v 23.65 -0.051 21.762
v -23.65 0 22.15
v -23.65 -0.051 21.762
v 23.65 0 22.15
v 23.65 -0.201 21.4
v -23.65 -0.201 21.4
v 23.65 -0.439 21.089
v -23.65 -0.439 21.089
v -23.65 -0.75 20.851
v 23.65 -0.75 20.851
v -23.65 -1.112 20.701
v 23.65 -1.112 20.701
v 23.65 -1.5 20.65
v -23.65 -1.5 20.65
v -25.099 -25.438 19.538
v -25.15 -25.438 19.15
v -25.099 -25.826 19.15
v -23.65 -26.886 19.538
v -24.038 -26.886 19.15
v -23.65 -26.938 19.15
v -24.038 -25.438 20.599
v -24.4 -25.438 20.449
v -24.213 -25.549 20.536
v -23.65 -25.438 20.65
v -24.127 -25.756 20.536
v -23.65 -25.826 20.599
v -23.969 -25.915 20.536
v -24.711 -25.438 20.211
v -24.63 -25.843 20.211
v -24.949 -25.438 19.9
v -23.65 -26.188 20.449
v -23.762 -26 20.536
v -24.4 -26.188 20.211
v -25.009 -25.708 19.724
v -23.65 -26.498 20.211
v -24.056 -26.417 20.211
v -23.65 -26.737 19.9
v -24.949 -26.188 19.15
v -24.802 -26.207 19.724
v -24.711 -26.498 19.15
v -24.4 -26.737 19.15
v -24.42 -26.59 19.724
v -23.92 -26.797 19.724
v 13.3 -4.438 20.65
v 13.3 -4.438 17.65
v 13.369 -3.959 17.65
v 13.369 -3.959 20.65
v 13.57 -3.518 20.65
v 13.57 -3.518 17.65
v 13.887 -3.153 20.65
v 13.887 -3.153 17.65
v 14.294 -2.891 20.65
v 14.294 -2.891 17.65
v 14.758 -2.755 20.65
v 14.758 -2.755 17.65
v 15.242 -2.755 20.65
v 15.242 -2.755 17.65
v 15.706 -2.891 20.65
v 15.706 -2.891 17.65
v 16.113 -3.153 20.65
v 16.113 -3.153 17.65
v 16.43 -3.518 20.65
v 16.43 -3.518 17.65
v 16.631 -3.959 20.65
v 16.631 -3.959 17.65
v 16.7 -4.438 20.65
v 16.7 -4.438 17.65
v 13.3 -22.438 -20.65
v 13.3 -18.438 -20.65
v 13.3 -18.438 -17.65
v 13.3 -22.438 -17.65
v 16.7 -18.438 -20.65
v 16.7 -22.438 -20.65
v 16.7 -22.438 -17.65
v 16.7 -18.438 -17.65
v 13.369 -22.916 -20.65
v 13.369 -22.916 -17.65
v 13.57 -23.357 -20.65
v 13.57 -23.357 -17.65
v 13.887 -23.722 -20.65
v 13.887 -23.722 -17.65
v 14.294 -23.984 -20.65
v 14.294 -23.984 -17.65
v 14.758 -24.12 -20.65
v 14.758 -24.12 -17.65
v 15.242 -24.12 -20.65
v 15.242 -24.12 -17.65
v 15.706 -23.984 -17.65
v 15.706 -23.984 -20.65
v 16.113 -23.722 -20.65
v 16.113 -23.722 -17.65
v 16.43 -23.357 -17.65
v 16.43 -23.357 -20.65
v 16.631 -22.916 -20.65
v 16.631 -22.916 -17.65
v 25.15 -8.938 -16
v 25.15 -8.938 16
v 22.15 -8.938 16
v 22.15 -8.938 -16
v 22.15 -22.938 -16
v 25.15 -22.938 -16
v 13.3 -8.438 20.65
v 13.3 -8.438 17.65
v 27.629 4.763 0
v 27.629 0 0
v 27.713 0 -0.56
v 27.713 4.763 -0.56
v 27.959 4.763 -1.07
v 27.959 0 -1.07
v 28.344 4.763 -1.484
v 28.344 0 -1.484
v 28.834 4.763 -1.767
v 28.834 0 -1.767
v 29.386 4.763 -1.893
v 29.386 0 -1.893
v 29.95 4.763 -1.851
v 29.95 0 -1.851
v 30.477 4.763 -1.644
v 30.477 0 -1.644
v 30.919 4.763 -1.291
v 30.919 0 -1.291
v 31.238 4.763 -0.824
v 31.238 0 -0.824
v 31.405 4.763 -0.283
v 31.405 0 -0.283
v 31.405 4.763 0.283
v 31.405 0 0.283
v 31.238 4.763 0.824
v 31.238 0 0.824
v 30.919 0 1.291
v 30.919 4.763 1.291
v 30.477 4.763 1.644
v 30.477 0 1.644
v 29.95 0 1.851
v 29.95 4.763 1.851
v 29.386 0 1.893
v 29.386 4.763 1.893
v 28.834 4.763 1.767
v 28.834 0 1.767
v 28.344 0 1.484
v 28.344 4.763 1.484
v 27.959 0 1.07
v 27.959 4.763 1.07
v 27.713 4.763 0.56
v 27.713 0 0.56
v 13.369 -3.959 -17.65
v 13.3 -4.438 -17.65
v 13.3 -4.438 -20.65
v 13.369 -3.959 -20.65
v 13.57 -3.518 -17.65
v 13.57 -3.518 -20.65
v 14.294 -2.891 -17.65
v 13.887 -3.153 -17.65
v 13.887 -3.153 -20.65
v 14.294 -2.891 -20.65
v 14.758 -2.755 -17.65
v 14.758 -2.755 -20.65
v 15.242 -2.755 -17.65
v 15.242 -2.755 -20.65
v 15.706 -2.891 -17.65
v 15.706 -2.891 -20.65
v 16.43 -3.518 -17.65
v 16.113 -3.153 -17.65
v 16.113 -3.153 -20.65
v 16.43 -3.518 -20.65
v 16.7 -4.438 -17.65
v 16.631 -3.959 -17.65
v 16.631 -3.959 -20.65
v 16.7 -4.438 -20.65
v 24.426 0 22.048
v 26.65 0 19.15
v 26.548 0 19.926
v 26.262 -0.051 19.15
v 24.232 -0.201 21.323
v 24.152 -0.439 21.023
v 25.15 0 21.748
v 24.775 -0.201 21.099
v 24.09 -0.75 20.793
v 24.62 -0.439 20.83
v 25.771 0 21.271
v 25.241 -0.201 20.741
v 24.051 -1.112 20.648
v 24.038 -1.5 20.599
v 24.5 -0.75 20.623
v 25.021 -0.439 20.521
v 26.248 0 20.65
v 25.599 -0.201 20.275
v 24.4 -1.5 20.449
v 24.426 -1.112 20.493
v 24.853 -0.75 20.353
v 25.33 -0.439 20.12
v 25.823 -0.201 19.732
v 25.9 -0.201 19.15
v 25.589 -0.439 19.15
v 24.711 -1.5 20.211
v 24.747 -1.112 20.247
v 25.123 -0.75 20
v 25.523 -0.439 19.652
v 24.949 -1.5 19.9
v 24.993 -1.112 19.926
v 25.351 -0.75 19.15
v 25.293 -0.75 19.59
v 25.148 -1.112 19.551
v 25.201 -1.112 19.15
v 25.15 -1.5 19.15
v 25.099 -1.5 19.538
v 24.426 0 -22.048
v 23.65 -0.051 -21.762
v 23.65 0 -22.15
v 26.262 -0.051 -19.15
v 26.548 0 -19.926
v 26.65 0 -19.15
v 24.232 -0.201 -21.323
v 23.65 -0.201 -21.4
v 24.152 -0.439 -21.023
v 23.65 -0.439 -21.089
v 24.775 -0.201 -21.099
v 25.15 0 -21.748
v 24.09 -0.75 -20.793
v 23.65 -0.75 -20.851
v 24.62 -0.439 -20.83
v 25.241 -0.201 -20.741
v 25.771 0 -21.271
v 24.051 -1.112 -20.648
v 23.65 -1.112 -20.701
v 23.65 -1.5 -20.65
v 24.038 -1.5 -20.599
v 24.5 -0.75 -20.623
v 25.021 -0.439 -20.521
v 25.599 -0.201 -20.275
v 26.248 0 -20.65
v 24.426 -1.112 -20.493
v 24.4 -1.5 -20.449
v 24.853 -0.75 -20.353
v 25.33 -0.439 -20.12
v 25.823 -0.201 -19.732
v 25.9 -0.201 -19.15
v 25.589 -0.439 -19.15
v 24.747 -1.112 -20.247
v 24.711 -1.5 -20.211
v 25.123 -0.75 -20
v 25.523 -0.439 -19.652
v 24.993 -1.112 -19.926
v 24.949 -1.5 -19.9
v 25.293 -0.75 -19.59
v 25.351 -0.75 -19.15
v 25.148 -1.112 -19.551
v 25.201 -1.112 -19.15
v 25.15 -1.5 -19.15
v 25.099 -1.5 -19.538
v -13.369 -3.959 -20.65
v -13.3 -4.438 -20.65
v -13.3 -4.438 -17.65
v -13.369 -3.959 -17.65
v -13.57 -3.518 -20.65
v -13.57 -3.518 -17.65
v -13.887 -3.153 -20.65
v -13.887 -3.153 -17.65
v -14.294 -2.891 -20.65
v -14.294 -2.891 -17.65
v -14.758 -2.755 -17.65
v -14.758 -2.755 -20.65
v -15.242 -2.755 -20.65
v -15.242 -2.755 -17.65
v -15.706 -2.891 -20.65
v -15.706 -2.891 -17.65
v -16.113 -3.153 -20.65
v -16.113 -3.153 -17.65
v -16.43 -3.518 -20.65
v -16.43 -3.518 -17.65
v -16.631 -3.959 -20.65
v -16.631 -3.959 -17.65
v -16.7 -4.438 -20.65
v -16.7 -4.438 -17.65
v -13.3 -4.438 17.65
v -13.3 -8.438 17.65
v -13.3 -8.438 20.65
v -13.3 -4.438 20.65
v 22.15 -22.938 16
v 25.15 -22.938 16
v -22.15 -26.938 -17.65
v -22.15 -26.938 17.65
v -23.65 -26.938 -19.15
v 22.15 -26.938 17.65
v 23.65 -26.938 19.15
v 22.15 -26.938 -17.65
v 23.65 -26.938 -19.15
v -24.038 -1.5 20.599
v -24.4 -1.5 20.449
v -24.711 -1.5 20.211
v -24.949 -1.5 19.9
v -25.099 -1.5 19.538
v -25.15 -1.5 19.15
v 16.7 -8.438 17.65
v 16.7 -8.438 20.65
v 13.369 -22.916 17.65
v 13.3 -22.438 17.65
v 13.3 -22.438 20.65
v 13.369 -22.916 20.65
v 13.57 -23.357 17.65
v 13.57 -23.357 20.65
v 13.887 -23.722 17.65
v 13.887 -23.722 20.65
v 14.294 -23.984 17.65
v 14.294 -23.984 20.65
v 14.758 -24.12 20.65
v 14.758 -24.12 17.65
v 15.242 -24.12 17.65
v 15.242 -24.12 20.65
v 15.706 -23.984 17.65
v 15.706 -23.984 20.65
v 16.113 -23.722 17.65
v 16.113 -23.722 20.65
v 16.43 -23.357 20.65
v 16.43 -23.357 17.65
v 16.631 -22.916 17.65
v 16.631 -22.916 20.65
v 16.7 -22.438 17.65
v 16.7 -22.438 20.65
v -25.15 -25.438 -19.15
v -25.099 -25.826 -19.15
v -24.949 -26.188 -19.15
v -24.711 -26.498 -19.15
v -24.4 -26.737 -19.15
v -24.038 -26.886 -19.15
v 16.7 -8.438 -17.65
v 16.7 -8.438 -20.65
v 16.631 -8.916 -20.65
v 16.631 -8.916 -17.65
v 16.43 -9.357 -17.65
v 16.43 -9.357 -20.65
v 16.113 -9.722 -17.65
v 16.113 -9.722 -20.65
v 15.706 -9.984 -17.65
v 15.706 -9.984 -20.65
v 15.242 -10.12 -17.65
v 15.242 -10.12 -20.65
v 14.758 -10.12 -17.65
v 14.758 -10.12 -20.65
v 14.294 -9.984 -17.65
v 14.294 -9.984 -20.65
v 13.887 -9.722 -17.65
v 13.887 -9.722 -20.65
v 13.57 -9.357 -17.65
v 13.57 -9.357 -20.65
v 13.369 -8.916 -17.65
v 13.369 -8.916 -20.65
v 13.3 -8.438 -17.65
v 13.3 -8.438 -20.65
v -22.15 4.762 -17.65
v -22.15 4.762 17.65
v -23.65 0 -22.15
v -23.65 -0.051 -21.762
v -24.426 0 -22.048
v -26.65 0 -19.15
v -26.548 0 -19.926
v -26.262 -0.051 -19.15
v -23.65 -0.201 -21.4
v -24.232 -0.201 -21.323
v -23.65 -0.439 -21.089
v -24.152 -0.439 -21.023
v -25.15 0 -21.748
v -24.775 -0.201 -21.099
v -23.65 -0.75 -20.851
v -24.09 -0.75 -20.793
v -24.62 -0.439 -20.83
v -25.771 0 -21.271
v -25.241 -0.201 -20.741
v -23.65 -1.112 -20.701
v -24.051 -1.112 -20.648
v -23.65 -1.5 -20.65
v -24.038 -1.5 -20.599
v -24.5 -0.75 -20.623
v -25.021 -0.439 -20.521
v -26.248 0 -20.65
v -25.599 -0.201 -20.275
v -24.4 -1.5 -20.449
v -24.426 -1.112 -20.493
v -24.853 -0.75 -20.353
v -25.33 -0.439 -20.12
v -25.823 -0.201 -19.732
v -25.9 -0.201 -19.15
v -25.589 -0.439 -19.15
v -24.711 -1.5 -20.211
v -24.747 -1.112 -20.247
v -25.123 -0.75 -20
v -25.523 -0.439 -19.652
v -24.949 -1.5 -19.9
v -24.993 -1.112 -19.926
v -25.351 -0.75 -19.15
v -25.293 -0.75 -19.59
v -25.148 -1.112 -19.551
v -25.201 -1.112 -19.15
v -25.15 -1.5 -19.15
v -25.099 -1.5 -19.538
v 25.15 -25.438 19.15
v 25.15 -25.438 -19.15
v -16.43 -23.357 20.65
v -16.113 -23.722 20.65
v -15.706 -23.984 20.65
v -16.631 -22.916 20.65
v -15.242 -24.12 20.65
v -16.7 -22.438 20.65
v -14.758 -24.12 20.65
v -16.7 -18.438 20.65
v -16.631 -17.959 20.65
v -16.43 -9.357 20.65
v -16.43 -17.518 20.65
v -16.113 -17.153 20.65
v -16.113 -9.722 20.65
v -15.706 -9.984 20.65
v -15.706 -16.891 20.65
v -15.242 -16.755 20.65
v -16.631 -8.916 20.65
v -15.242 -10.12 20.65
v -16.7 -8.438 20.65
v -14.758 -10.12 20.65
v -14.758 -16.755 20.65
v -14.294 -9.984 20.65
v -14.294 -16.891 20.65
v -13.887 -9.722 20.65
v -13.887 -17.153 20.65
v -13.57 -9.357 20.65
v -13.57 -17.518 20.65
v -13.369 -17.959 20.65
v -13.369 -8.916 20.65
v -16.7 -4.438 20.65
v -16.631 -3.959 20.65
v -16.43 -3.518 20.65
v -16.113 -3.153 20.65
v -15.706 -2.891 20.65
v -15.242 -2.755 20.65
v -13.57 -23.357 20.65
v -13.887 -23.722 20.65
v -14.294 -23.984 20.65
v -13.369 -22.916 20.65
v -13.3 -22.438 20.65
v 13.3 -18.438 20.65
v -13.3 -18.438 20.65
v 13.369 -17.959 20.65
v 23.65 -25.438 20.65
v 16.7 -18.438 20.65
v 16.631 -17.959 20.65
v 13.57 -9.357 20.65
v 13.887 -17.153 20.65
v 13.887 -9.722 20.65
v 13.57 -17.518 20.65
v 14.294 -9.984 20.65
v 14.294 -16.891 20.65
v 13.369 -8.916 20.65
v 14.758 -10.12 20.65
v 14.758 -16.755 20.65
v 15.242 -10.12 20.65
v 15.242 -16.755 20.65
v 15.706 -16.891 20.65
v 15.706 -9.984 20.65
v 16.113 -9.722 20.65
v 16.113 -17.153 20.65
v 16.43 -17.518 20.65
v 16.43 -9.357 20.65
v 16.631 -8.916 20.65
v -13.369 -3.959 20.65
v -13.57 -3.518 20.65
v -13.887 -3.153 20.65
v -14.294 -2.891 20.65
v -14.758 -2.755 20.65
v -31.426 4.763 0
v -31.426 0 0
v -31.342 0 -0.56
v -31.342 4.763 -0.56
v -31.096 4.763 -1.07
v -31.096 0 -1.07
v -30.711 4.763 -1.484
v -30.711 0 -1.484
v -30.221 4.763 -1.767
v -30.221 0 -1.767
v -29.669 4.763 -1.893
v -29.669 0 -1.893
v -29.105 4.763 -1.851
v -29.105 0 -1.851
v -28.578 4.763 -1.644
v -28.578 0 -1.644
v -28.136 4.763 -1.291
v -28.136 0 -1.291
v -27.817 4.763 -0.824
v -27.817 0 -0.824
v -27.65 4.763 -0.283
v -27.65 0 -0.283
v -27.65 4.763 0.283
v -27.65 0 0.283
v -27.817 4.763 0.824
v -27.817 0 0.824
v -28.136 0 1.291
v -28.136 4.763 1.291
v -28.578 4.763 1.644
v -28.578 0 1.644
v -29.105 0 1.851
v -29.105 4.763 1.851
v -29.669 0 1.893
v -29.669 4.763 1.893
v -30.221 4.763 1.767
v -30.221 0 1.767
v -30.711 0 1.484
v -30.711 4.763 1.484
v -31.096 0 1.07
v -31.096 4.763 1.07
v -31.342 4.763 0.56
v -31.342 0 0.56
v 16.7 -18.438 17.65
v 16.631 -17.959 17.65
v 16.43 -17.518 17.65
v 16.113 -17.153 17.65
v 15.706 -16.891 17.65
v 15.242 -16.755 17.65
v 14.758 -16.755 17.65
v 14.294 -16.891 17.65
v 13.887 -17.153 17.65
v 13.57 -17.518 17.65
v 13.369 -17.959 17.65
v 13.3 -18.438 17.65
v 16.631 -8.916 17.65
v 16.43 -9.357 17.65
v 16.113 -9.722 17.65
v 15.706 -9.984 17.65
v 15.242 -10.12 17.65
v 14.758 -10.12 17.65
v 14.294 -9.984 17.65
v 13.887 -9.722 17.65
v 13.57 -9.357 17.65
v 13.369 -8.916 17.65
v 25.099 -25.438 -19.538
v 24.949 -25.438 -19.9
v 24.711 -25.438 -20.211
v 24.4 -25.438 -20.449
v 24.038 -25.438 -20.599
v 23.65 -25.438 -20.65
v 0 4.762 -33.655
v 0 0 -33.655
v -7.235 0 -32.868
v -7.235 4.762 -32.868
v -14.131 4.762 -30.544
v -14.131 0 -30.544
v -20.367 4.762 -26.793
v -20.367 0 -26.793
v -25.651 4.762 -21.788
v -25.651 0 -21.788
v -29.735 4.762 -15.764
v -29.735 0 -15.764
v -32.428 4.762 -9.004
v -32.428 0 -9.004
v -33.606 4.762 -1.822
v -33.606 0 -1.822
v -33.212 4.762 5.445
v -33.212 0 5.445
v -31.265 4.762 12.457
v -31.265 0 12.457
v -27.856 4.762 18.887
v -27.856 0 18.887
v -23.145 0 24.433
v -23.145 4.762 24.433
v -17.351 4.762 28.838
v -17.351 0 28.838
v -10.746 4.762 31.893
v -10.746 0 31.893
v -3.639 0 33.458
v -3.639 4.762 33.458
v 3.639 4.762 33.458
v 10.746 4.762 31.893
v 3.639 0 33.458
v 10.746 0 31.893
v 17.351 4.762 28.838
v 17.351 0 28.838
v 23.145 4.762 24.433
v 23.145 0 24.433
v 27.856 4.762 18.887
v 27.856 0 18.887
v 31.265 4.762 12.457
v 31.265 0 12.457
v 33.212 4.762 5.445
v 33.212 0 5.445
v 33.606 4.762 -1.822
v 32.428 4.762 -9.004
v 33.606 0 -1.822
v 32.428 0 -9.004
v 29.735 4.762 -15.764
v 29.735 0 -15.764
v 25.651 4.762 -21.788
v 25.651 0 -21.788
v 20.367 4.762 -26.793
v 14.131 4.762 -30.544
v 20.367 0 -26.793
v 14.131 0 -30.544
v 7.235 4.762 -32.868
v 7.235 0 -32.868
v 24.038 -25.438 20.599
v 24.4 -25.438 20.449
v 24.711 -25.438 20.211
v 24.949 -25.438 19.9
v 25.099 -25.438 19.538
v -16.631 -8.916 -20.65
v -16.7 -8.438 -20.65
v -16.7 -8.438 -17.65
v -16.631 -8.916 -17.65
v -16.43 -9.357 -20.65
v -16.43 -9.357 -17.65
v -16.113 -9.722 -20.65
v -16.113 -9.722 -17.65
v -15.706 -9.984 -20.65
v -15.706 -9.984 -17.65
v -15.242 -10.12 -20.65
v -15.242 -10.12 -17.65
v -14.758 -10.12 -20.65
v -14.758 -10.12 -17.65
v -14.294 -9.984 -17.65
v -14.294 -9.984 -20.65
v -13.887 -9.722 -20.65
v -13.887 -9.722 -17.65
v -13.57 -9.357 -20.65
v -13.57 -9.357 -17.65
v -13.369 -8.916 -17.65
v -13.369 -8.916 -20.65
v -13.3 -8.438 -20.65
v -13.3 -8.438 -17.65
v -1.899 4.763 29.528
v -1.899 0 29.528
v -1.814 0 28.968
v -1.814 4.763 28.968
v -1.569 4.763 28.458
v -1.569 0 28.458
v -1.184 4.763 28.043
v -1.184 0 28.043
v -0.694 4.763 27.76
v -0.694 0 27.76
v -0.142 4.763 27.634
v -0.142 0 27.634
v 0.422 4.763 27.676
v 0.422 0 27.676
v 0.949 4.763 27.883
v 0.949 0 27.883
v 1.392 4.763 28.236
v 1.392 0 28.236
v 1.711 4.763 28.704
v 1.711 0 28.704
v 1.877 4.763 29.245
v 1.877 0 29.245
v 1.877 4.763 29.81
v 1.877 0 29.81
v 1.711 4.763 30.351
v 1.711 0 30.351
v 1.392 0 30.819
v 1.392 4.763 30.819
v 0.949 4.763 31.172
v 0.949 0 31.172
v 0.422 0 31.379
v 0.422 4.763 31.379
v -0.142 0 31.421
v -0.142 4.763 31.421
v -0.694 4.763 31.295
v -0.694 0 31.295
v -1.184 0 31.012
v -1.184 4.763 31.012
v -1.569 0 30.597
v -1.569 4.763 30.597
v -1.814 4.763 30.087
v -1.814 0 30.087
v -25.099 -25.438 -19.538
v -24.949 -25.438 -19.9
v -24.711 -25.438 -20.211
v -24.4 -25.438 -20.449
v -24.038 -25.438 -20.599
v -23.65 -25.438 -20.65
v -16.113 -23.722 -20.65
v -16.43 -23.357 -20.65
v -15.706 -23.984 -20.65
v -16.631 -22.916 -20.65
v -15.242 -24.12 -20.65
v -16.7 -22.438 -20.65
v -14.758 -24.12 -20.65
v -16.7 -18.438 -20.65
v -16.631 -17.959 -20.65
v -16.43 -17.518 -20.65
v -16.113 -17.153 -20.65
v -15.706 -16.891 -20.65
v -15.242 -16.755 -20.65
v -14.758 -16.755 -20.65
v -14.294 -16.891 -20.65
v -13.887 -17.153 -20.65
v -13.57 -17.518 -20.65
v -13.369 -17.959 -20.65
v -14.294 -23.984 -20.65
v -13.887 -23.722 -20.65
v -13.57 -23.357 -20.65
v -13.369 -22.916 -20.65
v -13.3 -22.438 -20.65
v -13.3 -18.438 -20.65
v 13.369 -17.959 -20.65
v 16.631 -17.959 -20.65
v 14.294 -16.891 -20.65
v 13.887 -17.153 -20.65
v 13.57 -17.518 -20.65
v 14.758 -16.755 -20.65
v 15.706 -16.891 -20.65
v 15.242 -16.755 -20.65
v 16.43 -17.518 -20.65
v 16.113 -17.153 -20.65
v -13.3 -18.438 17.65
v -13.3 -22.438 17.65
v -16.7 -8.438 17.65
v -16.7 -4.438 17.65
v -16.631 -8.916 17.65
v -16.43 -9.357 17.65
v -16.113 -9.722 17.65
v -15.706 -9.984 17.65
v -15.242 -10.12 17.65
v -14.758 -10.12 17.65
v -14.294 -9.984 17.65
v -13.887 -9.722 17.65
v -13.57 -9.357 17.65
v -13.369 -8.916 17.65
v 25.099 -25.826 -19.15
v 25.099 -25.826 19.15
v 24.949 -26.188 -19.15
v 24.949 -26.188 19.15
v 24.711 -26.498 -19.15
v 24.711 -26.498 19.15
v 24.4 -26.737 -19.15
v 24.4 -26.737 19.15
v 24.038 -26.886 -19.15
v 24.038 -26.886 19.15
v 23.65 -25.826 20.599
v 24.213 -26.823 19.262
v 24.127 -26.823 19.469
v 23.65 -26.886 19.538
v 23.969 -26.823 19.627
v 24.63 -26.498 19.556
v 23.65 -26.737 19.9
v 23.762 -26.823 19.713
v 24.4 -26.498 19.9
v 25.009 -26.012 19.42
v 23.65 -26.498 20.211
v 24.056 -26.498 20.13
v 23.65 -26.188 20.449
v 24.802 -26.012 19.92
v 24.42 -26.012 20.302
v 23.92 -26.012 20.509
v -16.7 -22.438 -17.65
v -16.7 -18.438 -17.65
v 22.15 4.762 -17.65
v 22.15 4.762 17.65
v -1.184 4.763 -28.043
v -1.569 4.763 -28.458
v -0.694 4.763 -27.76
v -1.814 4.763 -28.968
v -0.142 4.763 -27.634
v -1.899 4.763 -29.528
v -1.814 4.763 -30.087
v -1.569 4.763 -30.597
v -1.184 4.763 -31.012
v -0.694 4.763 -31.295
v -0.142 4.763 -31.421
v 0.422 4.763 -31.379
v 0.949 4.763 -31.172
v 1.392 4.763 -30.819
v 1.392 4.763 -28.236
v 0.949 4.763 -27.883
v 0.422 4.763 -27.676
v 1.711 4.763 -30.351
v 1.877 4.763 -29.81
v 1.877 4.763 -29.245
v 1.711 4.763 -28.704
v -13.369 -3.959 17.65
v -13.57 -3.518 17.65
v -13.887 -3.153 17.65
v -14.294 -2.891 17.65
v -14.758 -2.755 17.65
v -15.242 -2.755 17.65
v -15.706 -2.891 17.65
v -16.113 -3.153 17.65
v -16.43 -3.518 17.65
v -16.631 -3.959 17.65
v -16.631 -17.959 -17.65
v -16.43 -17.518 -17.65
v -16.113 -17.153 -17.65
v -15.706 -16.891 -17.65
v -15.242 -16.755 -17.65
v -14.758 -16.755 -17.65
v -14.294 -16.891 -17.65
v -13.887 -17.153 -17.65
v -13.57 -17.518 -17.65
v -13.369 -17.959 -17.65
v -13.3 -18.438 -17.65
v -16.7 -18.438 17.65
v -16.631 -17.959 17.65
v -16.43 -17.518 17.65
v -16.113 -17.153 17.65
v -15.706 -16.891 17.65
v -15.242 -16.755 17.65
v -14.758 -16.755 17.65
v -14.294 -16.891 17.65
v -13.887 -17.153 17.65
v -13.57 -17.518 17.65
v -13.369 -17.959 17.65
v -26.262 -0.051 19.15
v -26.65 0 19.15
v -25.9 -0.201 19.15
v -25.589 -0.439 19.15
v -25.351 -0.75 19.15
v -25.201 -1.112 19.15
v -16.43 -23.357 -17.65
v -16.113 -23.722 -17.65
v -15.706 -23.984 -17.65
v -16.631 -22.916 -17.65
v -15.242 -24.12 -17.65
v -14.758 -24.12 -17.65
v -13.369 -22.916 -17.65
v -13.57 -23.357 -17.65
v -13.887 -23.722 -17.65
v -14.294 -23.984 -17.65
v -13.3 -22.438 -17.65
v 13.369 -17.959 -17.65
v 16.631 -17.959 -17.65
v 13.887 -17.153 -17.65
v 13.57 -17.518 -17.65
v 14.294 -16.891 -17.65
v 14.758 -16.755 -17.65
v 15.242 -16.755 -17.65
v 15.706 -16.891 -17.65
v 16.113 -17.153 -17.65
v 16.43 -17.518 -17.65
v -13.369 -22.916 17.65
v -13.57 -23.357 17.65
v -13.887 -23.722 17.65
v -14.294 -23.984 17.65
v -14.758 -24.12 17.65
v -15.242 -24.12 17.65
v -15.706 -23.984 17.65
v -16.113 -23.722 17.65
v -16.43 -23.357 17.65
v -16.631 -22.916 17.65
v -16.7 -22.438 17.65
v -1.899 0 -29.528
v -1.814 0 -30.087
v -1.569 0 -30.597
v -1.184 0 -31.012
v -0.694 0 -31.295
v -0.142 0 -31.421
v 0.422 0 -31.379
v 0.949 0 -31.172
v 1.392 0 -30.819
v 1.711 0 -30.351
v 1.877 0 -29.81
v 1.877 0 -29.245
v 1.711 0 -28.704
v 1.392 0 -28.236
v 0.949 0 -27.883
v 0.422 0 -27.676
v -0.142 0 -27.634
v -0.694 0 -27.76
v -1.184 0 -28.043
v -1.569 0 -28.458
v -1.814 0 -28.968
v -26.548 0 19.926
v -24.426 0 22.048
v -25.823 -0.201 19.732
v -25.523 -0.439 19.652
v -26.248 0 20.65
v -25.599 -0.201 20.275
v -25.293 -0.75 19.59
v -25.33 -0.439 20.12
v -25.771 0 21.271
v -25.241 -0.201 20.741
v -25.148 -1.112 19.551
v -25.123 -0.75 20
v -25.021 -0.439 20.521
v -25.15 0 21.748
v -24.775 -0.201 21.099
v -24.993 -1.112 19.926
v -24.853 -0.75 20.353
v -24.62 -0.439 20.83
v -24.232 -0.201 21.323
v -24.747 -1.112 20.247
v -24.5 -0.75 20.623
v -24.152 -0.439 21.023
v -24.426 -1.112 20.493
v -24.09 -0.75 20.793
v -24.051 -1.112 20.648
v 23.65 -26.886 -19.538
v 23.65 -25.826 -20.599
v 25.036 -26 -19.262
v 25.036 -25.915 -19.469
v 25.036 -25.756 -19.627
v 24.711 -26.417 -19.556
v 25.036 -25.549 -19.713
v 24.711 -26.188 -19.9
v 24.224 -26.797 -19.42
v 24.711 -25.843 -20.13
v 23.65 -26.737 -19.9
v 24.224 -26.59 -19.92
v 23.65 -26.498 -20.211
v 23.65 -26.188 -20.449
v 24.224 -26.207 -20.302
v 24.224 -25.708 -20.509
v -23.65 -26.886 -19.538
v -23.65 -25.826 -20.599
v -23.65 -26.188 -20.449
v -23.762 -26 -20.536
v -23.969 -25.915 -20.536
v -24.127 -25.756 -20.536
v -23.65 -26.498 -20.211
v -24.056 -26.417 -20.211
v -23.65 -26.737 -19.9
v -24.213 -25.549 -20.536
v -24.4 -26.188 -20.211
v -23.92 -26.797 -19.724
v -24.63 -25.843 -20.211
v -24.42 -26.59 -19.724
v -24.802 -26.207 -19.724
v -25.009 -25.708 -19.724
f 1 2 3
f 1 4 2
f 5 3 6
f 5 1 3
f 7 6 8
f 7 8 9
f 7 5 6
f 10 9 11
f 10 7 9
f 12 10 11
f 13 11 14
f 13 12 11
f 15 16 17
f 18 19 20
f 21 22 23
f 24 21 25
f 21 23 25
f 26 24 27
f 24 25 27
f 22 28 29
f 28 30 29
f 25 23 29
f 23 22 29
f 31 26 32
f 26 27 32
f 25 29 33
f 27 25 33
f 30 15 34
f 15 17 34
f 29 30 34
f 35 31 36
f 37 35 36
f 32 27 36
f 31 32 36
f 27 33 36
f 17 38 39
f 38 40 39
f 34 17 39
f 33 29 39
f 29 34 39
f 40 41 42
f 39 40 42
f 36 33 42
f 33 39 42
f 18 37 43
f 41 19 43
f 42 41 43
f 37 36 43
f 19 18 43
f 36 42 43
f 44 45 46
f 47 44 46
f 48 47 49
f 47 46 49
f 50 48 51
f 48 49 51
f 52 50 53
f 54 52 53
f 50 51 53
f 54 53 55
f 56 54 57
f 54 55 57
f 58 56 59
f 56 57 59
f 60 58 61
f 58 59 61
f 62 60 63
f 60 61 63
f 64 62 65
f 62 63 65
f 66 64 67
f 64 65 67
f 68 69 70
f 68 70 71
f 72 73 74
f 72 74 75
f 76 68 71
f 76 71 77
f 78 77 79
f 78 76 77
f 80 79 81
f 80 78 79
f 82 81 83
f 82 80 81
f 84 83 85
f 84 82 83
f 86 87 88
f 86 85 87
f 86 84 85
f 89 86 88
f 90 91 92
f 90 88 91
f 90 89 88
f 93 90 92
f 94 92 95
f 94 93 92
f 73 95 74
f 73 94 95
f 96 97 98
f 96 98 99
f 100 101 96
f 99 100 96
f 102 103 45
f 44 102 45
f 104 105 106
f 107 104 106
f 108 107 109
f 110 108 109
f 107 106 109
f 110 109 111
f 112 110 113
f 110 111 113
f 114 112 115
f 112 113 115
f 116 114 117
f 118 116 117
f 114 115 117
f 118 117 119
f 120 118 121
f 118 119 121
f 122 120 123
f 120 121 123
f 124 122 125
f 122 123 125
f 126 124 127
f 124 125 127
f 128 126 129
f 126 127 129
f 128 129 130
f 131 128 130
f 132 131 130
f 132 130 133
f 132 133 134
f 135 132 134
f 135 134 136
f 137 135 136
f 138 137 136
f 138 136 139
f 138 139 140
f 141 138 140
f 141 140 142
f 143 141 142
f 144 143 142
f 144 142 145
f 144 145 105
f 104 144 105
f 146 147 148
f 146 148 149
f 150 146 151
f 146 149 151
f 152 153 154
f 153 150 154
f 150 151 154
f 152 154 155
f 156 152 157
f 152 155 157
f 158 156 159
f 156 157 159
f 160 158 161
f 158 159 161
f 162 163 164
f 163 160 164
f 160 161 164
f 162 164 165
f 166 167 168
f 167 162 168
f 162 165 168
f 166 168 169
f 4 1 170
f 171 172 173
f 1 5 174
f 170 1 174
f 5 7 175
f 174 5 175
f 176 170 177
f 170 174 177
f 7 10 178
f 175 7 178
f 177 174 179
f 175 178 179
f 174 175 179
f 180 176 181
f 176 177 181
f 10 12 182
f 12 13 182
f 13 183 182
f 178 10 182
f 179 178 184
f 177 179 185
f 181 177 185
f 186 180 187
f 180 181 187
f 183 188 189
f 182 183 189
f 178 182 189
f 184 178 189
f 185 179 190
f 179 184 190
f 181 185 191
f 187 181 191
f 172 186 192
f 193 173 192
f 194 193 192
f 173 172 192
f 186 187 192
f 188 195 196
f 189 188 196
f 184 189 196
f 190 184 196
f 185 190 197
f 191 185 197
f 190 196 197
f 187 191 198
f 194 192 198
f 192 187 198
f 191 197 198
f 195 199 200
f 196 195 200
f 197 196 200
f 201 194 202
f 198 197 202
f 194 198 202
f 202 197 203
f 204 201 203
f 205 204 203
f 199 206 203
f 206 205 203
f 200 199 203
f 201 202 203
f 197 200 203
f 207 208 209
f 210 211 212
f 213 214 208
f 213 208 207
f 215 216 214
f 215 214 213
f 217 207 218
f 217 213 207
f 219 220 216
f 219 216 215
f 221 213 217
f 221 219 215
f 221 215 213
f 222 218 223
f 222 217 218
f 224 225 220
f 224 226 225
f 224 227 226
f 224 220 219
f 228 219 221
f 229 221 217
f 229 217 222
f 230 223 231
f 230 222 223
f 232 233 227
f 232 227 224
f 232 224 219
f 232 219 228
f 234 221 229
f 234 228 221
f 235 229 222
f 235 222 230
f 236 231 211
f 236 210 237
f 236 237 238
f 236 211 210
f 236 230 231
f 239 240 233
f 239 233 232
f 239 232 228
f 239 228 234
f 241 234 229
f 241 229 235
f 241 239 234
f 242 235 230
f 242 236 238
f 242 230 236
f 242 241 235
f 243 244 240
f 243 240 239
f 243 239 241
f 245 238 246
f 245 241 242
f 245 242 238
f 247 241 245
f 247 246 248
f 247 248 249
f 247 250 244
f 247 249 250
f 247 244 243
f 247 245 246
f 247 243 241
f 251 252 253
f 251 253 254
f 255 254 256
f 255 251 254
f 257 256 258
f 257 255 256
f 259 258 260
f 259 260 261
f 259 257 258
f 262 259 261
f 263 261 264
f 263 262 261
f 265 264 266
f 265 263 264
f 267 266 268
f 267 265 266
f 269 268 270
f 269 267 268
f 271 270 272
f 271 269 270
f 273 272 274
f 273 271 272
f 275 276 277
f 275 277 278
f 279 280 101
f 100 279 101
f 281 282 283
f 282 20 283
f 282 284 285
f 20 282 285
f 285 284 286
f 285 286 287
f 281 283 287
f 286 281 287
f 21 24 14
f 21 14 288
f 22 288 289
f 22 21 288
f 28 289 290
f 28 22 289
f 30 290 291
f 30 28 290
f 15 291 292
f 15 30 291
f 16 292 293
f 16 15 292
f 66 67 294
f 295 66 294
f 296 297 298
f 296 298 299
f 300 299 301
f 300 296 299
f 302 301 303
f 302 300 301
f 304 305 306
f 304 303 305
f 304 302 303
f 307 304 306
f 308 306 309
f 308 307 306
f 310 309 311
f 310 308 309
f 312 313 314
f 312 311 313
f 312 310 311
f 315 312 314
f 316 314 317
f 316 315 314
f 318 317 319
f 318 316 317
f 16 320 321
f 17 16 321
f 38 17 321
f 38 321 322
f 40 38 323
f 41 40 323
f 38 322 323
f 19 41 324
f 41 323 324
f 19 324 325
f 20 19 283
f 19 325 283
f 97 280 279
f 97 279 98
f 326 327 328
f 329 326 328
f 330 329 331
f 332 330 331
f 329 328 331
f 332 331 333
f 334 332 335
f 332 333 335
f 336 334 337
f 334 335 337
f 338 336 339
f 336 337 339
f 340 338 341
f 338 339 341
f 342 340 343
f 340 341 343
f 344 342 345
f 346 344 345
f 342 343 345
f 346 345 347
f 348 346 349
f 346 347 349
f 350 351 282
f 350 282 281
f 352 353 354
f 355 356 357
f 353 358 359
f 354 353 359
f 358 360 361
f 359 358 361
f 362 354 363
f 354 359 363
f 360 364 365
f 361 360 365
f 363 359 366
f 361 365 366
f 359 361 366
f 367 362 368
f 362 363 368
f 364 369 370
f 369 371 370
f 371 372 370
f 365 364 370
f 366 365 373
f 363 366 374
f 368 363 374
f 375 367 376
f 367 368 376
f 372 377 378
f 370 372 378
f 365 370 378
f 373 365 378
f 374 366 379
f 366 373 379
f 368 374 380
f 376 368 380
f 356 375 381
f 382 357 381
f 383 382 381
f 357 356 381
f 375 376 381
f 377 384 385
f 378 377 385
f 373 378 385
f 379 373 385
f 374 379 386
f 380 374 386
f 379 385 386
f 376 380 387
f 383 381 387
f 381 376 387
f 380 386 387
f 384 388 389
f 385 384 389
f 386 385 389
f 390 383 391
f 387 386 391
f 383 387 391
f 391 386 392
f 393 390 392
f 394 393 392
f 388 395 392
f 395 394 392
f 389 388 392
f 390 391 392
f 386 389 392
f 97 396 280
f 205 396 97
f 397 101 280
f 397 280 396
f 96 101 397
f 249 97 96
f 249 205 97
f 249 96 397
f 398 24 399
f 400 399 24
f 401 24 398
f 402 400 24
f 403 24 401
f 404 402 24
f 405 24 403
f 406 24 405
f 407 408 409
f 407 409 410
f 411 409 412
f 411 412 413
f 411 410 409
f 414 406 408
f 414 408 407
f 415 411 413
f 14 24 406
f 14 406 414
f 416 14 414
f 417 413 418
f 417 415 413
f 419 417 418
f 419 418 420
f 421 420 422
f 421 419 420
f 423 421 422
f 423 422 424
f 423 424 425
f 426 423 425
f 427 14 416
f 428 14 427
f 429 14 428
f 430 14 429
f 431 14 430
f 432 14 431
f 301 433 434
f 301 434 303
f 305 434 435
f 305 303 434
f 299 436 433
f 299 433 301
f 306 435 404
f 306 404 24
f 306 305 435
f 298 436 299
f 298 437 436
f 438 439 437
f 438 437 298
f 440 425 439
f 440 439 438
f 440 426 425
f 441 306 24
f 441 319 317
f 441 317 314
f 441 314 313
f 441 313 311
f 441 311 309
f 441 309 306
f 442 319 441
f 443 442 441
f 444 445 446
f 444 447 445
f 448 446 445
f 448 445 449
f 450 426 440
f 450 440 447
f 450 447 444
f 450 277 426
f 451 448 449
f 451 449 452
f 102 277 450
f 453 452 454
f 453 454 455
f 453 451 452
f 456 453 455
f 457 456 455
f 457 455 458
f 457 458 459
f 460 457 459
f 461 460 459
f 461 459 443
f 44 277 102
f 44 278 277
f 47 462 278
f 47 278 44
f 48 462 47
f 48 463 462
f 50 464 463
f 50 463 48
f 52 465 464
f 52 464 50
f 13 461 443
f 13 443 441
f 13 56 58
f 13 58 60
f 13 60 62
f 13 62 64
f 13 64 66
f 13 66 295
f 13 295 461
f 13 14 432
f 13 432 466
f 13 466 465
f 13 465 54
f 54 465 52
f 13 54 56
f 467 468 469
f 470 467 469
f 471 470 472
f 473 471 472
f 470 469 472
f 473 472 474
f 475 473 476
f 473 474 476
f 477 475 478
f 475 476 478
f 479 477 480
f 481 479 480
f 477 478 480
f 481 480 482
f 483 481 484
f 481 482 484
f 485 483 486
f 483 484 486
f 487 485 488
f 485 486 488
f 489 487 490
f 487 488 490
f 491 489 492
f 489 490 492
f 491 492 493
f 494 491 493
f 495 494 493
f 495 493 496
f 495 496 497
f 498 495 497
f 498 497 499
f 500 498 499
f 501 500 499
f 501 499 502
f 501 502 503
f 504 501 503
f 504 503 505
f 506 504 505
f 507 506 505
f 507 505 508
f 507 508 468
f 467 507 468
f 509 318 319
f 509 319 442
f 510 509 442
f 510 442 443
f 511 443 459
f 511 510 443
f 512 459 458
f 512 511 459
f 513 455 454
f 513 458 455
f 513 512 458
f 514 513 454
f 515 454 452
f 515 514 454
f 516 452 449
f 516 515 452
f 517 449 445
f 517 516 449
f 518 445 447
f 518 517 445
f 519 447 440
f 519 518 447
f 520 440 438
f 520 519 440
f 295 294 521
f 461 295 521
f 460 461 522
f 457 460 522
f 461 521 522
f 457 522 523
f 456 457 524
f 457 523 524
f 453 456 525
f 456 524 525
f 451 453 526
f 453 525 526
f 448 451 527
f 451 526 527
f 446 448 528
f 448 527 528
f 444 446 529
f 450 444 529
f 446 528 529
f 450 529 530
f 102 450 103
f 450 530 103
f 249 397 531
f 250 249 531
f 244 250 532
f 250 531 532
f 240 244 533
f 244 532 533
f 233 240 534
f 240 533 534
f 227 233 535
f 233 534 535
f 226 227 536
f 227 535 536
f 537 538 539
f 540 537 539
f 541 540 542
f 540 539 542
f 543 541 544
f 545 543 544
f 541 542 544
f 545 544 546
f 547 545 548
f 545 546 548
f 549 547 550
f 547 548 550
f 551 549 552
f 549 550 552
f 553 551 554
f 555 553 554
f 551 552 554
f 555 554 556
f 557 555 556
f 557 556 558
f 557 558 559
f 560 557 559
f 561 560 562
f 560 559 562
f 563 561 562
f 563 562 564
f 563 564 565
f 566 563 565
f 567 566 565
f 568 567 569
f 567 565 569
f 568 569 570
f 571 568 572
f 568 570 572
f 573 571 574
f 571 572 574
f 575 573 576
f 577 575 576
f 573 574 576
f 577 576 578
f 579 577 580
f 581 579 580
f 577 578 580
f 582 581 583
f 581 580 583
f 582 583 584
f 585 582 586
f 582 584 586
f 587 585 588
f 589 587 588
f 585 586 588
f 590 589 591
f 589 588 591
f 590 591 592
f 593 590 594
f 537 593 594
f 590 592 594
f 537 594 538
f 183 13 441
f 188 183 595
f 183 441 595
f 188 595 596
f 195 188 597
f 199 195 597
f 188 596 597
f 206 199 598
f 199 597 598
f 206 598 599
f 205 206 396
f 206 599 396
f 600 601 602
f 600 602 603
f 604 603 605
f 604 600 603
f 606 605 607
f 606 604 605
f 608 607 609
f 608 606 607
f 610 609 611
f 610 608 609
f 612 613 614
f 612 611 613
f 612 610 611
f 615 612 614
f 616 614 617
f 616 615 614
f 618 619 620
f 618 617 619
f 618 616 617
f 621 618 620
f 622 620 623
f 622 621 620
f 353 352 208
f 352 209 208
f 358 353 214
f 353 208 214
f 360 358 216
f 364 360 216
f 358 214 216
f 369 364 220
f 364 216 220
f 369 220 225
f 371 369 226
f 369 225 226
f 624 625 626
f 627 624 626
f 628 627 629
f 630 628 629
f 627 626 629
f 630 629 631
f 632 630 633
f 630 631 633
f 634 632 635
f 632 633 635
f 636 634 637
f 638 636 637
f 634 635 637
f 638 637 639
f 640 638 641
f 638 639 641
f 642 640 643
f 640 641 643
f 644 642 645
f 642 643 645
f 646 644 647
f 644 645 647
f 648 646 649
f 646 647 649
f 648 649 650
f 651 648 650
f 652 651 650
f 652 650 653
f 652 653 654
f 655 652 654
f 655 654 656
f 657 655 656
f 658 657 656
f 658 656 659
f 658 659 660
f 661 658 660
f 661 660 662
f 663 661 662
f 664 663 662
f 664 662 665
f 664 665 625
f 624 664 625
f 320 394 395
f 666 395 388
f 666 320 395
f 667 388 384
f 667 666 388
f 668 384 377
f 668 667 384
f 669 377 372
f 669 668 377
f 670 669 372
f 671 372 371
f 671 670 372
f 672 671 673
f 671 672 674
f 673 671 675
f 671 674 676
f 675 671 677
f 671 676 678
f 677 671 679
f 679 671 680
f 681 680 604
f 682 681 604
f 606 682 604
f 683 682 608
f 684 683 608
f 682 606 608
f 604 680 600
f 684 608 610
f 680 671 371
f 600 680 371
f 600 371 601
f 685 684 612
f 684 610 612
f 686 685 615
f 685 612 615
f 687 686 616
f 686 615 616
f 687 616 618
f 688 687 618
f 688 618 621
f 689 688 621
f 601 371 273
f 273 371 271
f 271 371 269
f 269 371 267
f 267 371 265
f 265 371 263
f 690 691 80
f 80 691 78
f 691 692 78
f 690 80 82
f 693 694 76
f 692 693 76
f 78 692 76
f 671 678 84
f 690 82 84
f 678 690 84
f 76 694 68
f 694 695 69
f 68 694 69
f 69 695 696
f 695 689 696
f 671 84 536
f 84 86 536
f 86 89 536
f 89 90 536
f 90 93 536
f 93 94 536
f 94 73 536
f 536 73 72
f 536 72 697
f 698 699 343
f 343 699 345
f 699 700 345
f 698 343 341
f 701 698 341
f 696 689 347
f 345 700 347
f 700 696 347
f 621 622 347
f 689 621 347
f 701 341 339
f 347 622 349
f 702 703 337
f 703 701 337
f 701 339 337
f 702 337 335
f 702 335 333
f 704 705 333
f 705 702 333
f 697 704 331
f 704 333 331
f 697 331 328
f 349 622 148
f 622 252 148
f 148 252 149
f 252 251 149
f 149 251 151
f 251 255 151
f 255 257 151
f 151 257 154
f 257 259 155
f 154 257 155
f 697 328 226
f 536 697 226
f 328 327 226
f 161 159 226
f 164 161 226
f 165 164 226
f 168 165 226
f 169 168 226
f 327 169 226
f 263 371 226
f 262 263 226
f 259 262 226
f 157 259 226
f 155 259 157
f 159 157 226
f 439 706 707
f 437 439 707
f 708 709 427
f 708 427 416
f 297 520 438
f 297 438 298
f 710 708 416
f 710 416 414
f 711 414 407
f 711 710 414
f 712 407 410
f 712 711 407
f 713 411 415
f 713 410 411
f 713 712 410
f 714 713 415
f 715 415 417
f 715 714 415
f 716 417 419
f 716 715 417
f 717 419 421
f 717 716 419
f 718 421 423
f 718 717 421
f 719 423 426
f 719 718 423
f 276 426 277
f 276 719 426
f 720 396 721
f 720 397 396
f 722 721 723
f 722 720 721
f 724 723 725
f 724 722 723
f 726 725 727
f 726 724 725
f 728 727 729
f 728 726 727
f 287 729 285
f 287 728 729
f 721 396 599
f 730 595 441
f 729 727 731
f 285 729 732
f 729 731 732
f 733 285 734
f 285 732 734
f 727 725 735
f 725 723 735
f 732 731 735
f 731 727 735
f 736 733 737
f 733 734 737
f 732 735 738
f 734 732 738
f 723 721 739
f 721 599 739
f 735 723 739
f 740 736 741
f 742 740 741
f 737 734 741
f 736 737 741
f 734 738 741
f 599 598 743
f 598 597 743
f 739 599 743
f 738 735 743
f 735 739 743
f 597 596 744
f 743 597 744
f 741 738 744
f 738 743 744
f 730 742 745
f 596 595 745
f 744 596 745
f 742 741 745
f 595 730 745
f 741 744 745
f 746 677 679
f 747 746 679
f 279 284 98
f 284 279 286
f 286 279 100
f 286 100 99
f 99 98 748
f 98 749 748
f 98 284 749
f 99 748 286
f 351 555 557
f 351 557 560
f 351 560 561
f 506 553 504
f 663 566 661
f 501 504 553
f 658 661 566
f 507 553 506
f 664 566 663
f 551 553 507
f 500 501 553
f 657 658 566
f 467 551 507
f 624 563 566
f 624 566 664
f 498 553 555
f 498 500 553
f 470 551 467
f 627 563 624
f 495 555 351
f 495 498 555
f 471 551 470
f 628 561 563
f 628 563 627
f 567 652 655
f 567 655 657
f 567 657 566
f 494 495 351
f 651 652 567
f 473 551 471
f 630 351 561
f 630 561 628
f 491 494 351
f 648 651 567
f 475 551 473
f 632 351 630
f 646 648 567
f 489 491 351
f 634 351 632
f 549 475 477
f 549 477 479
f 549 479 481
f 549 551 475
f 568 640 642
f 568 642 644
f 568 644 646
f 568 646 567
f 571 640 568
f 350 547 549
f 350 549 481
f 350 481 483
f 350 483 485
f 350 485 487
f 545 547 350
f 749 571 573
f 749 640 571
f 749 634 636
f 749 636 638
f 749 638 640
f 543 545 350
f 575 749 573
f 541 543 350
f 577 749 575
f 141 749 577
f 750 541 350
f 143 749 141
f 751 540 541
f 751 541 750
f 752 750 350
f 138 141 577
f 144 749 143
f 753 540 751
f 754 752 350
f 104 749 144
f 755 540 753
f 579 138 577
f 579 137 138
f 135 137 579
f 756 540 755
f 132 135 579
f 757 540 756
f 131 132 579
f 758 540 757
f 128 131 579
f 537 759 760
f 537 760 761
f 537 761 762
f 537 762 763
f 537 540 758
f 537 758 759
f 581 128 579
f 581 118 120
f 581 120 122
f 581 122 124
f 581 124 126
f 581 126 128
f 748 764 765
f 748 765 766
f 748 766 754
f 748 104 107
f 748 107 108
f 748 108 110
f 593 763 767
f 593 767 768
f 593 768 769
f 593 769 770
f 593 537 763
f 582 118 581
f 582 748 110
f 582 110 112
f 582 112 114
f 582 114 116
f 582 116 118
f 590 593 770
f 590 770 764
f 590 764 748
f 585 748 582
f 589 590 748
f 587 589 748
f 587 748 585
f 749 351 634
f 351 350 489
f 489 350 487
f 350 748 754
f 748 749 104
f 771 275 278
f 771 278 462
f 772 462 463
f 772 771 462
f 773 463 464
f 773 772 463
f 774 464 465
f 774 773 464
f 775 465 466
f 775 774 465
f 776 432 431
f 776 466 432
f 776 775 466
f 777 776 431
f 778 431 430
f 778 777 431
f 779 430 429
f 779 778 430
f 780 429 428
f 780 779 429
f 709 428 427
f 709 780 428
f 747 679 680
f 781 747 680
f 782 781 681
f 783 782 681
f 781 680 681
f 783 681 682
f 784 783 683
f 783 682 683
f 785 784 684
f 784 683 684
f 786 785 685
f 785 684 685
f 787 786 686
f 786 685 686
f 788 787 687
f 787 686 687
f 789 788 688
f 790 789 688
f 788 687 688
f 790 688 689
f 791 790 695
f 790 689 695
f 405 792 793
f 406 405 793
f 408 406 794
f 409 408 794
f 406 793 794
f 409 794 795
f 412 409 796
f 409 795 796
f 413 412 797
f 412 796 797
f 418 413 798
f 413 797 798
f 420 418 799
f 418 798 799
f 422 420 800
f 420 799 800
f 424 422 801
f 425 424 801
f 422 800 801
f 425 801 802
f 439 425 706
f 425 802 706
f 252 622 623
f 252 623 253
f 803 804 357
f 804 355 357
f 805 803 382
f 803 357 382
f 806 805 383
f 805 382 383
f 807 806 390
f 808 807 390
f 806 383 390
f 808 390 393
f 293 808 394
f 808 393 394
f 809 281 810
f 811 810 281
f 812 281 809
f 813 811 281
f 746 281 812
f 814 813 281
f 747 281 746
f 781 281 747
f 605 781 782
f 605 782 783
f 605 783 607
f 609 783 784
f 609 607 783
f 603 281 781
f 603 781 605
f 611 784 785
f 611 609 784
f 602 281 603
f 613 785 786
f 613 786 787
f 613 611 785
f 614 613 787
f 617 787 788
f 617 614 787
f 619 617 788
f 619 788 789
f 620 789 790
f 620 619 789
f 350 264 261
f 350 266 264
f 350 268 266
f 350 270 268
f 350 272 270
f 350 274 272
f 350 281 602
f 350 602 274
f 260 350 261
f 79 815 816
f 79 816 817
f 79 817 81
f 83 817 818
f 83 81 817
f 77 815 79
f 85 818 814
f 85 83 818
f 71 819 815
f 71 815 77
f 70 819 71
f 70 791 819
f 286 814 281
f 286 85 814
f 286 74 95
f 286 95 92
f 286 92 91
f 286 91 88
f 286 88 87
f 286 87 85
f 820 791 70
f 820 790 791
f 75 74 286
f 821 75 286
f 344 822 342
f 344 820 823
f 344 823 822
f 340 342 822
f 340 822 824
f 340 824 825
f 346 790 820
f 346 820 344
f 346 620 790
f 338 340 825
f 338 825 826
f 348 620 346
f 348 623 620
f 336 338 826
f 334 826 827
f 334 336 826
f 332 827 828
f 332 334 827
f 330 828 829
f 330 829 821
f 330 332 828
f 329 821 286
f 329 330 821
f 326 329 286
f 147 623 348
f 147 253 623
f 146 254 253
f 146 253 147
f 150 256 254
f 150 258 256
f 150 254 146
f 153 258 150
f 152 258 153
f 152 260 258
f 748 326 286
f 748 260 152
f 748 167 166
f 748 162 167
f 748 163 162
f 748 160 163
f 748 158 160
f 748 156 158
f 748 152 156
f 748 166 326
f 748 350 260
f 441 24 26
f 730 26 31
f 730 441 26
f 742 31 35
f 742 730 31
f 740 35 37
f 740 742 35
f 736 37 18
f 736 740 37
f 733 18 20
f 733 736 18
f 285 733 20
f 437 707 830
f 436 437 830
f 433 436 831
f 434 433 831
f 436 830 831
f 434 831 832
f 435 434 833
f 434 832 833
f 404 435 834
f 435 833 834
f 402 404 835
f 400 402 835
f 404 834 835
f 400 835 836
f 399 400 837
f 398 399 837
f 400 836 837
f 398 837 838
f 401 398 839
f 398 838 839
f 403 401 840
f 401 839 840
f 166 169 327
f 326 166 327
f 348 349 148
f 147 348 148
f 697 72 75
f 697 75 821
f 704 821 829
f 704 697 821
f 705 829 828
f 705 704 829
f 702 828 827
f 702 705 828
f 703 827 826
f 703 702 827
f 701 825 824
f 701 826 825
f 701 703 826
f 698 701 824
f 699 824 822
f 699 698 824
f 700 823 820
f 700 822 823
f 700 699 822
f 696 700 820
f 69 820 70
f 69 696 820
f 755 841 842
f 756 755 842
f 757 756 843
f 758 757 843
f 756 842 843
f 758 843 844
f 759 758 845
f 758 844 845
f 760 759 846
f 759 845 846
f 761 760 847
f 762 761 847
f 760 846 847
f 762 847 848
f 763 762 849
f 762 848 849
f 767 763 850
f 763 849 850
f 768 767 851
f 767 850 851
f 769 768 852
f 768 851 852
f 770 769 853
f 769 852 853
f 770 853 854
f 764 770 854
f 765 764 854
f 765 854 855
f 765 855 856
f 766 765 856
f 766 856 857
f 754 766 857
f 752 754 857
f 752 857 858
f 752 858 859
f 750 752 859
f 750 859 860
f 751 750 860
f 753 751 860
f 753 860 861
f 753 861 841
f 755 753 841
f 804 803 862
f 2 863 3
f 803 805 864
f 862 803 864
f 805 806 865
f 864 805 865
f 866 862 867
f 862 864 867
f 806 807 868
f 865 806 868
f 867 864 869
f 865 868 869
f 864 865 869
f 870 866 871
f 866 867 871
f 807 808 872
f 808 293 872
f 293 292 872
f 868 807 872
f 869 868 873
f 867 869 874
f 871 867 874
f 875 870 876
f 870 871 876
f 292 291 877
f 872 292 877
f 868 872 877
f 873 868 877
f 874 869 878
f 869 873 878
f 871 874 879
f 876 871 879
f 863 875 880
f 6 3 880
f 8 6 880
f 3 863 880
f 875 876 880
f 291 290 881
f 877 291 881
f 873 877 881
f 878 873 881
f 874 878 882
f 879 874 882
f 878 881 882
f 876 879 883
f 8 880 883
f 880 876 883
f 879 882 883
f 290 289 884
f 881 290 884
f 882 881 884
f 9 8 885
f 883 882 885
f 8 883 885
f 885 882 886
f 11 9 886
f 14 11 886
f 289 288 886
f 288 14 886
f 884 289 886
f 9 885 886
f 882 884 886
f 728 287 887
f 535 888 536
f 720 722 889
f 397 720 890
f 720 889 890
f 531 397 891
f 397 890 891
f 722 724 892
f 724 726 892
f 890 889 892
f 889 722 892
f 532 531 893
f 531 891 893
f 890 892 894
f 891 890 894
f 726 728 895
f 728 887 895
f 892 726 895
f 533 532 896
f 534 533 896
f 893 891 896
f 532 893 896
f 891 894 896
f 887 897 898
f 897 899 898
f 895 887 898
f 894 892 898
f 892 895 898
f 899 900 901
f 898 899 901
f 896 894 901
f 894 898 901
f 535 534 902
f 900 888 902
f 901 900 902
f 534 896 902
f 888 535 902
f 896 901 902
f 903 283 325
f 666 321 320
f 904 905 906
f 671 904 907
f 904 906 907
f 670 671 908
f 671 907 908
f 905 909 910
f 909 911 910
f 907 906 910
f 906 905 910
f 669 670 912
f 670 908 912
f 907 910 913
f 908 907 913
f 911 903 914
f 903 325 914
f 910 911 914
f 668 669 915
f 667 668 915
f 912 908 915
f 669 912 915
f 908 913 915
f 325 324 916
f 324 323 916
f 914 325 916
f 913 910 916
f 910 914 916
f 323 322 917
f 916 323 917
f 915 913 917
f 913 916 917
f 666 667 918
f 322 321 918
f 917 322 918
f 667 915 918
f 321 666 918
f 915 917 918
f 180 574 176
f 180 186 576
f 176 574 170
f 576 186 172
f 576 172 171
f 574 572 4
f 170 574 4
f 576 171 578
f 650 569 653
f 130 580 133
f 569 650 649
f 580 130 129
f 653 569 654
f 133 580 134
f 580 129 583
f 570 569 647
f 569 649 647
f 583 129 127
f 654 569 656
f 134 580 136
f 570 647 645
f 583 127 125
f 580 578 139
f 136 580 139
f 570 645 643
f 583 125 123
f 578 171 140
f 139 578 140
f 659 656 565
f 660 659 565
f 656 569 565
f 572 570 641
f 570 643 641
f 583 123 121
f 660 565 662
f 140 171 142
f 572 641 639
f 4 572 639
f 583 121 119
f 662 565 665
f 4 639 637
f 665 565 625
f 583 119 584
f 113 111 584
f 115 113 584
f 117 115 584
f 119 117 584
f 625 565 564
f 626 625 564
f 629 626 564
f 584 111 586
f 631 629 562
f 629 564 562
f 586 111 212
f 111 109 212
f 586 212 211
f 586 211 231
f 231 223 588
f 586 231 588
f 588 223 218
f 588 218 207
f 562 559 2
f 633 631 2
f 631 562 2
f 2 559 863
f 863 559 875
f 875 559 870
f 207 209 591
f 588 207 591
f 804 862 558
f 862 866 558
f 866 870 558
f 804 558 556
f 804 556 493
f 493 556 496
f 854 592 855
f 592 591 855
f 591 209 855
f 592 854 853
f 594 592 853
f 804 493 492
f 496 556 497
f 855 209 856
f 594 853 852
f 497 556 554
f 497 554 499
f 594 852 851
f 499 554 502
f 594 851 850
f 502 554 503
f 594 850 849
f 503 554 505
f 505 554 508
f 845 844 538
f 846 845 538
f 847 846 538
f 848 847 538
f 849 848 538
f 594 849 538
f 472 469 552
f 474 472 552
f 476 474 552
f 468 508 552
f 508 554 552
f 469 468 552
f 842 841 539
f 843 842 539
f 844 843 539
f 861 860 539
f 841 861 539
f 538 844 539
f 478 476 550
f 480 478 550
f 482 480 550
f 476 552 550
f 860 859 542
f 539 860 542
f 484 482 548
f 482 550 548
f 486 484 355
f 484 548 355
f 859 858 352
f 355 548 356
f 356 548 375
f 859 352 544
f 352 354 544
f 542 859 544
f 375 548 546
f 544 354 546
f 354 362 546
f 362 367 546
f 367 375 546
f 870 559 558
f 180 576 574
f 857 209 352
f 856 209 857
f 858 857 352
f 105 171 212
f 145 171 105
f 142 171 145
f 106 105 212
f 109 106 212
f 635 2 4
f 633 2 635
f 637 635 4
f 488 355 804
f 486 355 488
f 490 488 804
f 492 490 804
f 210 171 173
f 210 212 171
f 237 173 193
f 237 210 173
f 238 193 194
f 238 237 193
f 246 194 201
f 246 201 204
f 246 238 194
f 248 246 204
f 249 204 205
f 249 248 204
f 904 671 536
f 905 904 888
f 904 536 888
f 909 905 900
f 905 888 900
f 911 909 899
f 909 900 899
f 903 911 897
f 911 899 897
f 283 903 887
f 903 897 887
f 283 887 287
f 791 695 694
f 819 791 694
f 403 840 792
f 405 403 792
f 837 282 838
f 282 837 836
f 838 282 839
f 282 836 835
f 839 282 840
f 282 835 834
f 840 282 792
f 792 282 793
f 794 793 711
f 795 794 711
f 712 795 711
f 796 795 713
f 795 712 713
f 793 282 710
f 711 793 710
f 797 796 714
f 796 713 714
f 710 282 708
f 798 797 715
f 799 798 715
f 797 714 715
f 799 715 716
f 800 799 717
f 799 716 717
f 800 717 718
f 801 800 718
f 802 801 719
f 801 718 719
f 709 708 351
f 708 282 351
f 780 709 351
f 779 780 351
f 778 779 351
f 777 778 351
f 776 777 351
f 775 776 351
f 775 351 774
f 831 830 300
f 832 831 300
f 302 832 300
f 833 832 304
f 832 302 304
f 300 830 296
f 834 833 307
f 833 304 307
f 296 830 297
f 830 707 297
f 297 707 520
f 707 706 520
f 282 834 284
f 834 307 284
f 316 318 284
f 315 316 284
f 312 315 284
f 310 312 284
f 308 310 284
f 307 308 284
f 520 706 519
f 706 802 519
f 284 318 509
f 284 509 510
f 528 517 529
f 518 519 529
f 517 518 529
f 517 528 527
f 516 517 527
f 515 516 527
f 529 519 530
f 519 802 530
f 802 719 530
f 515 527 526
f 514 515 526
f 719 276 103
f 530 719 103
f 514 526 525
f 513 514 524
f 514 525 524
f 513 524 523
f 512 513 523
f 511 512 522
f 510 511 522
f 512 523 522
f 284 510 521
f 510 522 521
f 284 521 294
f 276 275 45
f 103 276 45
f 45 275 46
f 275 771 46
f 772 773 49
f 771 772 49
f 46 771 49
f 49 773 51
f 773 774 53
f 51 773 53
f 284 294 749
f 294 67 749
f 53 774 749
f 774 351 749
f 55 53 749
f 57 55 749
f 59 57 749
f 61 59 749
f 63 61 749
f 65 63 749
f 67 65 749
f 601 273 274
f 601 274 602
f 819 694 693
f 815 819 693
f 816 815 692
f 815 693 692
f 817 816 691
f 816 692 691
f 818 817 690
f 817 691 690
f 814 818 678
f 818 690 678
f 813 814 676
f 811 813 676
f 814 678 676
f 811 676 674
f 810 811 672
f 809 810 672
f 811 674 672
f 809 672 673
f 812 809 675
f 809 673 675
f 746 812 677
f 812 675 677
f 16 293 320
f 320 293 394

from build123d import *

# Parameters (mm, degrees)
SKETCH1_R             = 33.655
BOSS_EXTRUDE1_DEPTH   = 4.7625
SKETCH2_W             = 50.3
SKETCH2_H             = 41.3
BOSS_EXTRUDE2_DEPTH   = 31.7
F_6_CLEARANCE_HOLE1_D = 3.7973
SKETCH6_W             = 44.3
SKETCH6_H             = 35.3
CUT_EXTRUDE1_DEPTH    = 28.7
SKETCH7_W             = 32
SKETCH7_H             = 14
CUT_EXTRUDE2_DEPTH    = 3
FILLET1_R             = 1.5
CUT_EXTRUDE3_DEPTH    = 70.334846623
MIRROR2_COPY_1_DEPTH  = 70.334846623


with BuildPart() as part:
    # Sketch1 → Boss-Extrude1 (new body)
    with BuildSketch(Plane(origin=(0, 0, 0), x_dir=(1, 0, 0), z_dir=(0, 1, 0))):
        with Locations(Location((0, 0, 0), (0, 0, 90))):
            Circle(SKETCH1_R)
    extrude(amount=BOSS_EXTRUDE1_DEPTH)

    # Sketch2 → Boss-Extrude2 (add)
    with BuildSketch(Plane(origin=(0, 4.7625, 0), x_dir=(1, 0, 0), z_dir=(0, 1, 0))):
        Rectangle(SKETCH2_W, SKETCH2_H)
    extrude(amount=-BOSS_EXTRUDE2_DEPTH)

    # #6 Clearance Hole1 (through all)
    with Locations(Plane(origin=(0, 4.7625, 0), x_dir=(1, 0, 0), z_dir=(0, 1, 0))):
        with Locations((0, 29.5275), (29.5275, 0), (0, -29.5275), (-29.5275, 0)):
            Hole(F_6_CLEARANCE_HOLE1_D / 2)

    # Sketch6 → Cut-Extrude1 (cut)
    with BuildSketch(Plane(origin=(0, 4.7625, 0), x_dir=(1, 0, 0), z_dir=(0, 1, 0))):
        Rectangle(SKETCH6_W, SKETCH6_H)
    cut_extrude1 = extrude(amount=-CUT_EXTRUDE1_DEPTH, mode=Mode.SUBTRACT)

    # Sketch7 → Cut-Extrude2 (cut)
    with BuildSketch(Plane(origin=(25.15, 0, 0), x_dir=(0, 0, -1), z_dir=(1, 0, 0))):
        with Locations((0, -15.9375)):
            Rectangle(SKETCH7_W, SKETCH7_H)
    extrude(amount=-CUT_EXTRUDE2_DEPTH, mode=Mode.SUBTRACT)

    # Fillet1
    fillet1_edges = [part.edges().sort_by_distance(p)[0] for p in [
        (25.15, -13.46875, 20.65),
        (-25.15, -26.9375, 0),
        (-25.15, -13.46875, 20.65),
        (0, -26.9375, -20.65),
        (-25.15, -13.46875, -20.65),
        (0, 0, -20.65),
        (-25.15, 0, 0),
        (0, 0, 20.65),
        (25.15, 0, 0),
        (25.15, -26.9375, 0),
        (25.15, -13.46875, -20.65),
        (0, -26.9375, 20.65),
    ]]
    fillet(fillet1_edges, radius=FILLET1_R)

    # Sketch14 → Cut-Extrude3 (cut, through all)
    with BuildSketch(Plane.XY.offset(-20.65)):
        with BuildLine():
            Line((13.3, -8.4375), (13.3, -4.4375))
            ThreePointArc((13.3, -4.4375), (15, -2.7375), (16.7, -4.4375))
            Line((16.7, -4.4375), (16.7, -8.4375))
            ThreePointArc((16.7, -8.4375), (15, -10.1375), (13.3, -8.4375))
        make_face()
    cut_extrude3 = extrude(amount=CUT_EXTRUDE3_DEPTH, mode=Mode.SUBTRACT)

    # Mirror1: Cut-Extrude3 across plane
    add(cut_extrude3.mirror(Plane(origin=(0, 0, 0), x_dir=(0, 0, 1), z_dir=(1, 0, 0))), mode=Mode.SUBTRACT)

    # Mirror2: Cut-Extrude1, Cut-Extrude3 across plane
    add(cut_extrude1.mirror(Plane.ZX.offset(-13.4375)), mode=Mode.SUBTRACT)
    add(cut_extrude3.mirror(Plane.ZX.offset(-13.4375)), mode=Mode.SUBTRACT)

    # Mirror2 copy 1 sketch → Mirror2 copy 1 (cut, through all)
    with BuildSketch(Plane(origin=(0, -26.875, -20.65), x_dir=(-1, 0, 0), z_dir=(0, 0, 1))):
        with BuildLine():
            Line((13.3, -8.4375), (13.3, -4.4375))
            ThreePointArc((13.3, -4.4375), (15, -2.7375), (16.7, -4.4375))
            Line((16.7, -4.4375), (16.7, -8.4375))
            ThreePointArc((16.7, -8.4375), (15, -10.1375), (13.3, -8.4375))
        make_face()
    extrude(amount=MIRROR2_COPY_1_DEPTH, mode=Mode.SUBTRACT)


solid = part.part
